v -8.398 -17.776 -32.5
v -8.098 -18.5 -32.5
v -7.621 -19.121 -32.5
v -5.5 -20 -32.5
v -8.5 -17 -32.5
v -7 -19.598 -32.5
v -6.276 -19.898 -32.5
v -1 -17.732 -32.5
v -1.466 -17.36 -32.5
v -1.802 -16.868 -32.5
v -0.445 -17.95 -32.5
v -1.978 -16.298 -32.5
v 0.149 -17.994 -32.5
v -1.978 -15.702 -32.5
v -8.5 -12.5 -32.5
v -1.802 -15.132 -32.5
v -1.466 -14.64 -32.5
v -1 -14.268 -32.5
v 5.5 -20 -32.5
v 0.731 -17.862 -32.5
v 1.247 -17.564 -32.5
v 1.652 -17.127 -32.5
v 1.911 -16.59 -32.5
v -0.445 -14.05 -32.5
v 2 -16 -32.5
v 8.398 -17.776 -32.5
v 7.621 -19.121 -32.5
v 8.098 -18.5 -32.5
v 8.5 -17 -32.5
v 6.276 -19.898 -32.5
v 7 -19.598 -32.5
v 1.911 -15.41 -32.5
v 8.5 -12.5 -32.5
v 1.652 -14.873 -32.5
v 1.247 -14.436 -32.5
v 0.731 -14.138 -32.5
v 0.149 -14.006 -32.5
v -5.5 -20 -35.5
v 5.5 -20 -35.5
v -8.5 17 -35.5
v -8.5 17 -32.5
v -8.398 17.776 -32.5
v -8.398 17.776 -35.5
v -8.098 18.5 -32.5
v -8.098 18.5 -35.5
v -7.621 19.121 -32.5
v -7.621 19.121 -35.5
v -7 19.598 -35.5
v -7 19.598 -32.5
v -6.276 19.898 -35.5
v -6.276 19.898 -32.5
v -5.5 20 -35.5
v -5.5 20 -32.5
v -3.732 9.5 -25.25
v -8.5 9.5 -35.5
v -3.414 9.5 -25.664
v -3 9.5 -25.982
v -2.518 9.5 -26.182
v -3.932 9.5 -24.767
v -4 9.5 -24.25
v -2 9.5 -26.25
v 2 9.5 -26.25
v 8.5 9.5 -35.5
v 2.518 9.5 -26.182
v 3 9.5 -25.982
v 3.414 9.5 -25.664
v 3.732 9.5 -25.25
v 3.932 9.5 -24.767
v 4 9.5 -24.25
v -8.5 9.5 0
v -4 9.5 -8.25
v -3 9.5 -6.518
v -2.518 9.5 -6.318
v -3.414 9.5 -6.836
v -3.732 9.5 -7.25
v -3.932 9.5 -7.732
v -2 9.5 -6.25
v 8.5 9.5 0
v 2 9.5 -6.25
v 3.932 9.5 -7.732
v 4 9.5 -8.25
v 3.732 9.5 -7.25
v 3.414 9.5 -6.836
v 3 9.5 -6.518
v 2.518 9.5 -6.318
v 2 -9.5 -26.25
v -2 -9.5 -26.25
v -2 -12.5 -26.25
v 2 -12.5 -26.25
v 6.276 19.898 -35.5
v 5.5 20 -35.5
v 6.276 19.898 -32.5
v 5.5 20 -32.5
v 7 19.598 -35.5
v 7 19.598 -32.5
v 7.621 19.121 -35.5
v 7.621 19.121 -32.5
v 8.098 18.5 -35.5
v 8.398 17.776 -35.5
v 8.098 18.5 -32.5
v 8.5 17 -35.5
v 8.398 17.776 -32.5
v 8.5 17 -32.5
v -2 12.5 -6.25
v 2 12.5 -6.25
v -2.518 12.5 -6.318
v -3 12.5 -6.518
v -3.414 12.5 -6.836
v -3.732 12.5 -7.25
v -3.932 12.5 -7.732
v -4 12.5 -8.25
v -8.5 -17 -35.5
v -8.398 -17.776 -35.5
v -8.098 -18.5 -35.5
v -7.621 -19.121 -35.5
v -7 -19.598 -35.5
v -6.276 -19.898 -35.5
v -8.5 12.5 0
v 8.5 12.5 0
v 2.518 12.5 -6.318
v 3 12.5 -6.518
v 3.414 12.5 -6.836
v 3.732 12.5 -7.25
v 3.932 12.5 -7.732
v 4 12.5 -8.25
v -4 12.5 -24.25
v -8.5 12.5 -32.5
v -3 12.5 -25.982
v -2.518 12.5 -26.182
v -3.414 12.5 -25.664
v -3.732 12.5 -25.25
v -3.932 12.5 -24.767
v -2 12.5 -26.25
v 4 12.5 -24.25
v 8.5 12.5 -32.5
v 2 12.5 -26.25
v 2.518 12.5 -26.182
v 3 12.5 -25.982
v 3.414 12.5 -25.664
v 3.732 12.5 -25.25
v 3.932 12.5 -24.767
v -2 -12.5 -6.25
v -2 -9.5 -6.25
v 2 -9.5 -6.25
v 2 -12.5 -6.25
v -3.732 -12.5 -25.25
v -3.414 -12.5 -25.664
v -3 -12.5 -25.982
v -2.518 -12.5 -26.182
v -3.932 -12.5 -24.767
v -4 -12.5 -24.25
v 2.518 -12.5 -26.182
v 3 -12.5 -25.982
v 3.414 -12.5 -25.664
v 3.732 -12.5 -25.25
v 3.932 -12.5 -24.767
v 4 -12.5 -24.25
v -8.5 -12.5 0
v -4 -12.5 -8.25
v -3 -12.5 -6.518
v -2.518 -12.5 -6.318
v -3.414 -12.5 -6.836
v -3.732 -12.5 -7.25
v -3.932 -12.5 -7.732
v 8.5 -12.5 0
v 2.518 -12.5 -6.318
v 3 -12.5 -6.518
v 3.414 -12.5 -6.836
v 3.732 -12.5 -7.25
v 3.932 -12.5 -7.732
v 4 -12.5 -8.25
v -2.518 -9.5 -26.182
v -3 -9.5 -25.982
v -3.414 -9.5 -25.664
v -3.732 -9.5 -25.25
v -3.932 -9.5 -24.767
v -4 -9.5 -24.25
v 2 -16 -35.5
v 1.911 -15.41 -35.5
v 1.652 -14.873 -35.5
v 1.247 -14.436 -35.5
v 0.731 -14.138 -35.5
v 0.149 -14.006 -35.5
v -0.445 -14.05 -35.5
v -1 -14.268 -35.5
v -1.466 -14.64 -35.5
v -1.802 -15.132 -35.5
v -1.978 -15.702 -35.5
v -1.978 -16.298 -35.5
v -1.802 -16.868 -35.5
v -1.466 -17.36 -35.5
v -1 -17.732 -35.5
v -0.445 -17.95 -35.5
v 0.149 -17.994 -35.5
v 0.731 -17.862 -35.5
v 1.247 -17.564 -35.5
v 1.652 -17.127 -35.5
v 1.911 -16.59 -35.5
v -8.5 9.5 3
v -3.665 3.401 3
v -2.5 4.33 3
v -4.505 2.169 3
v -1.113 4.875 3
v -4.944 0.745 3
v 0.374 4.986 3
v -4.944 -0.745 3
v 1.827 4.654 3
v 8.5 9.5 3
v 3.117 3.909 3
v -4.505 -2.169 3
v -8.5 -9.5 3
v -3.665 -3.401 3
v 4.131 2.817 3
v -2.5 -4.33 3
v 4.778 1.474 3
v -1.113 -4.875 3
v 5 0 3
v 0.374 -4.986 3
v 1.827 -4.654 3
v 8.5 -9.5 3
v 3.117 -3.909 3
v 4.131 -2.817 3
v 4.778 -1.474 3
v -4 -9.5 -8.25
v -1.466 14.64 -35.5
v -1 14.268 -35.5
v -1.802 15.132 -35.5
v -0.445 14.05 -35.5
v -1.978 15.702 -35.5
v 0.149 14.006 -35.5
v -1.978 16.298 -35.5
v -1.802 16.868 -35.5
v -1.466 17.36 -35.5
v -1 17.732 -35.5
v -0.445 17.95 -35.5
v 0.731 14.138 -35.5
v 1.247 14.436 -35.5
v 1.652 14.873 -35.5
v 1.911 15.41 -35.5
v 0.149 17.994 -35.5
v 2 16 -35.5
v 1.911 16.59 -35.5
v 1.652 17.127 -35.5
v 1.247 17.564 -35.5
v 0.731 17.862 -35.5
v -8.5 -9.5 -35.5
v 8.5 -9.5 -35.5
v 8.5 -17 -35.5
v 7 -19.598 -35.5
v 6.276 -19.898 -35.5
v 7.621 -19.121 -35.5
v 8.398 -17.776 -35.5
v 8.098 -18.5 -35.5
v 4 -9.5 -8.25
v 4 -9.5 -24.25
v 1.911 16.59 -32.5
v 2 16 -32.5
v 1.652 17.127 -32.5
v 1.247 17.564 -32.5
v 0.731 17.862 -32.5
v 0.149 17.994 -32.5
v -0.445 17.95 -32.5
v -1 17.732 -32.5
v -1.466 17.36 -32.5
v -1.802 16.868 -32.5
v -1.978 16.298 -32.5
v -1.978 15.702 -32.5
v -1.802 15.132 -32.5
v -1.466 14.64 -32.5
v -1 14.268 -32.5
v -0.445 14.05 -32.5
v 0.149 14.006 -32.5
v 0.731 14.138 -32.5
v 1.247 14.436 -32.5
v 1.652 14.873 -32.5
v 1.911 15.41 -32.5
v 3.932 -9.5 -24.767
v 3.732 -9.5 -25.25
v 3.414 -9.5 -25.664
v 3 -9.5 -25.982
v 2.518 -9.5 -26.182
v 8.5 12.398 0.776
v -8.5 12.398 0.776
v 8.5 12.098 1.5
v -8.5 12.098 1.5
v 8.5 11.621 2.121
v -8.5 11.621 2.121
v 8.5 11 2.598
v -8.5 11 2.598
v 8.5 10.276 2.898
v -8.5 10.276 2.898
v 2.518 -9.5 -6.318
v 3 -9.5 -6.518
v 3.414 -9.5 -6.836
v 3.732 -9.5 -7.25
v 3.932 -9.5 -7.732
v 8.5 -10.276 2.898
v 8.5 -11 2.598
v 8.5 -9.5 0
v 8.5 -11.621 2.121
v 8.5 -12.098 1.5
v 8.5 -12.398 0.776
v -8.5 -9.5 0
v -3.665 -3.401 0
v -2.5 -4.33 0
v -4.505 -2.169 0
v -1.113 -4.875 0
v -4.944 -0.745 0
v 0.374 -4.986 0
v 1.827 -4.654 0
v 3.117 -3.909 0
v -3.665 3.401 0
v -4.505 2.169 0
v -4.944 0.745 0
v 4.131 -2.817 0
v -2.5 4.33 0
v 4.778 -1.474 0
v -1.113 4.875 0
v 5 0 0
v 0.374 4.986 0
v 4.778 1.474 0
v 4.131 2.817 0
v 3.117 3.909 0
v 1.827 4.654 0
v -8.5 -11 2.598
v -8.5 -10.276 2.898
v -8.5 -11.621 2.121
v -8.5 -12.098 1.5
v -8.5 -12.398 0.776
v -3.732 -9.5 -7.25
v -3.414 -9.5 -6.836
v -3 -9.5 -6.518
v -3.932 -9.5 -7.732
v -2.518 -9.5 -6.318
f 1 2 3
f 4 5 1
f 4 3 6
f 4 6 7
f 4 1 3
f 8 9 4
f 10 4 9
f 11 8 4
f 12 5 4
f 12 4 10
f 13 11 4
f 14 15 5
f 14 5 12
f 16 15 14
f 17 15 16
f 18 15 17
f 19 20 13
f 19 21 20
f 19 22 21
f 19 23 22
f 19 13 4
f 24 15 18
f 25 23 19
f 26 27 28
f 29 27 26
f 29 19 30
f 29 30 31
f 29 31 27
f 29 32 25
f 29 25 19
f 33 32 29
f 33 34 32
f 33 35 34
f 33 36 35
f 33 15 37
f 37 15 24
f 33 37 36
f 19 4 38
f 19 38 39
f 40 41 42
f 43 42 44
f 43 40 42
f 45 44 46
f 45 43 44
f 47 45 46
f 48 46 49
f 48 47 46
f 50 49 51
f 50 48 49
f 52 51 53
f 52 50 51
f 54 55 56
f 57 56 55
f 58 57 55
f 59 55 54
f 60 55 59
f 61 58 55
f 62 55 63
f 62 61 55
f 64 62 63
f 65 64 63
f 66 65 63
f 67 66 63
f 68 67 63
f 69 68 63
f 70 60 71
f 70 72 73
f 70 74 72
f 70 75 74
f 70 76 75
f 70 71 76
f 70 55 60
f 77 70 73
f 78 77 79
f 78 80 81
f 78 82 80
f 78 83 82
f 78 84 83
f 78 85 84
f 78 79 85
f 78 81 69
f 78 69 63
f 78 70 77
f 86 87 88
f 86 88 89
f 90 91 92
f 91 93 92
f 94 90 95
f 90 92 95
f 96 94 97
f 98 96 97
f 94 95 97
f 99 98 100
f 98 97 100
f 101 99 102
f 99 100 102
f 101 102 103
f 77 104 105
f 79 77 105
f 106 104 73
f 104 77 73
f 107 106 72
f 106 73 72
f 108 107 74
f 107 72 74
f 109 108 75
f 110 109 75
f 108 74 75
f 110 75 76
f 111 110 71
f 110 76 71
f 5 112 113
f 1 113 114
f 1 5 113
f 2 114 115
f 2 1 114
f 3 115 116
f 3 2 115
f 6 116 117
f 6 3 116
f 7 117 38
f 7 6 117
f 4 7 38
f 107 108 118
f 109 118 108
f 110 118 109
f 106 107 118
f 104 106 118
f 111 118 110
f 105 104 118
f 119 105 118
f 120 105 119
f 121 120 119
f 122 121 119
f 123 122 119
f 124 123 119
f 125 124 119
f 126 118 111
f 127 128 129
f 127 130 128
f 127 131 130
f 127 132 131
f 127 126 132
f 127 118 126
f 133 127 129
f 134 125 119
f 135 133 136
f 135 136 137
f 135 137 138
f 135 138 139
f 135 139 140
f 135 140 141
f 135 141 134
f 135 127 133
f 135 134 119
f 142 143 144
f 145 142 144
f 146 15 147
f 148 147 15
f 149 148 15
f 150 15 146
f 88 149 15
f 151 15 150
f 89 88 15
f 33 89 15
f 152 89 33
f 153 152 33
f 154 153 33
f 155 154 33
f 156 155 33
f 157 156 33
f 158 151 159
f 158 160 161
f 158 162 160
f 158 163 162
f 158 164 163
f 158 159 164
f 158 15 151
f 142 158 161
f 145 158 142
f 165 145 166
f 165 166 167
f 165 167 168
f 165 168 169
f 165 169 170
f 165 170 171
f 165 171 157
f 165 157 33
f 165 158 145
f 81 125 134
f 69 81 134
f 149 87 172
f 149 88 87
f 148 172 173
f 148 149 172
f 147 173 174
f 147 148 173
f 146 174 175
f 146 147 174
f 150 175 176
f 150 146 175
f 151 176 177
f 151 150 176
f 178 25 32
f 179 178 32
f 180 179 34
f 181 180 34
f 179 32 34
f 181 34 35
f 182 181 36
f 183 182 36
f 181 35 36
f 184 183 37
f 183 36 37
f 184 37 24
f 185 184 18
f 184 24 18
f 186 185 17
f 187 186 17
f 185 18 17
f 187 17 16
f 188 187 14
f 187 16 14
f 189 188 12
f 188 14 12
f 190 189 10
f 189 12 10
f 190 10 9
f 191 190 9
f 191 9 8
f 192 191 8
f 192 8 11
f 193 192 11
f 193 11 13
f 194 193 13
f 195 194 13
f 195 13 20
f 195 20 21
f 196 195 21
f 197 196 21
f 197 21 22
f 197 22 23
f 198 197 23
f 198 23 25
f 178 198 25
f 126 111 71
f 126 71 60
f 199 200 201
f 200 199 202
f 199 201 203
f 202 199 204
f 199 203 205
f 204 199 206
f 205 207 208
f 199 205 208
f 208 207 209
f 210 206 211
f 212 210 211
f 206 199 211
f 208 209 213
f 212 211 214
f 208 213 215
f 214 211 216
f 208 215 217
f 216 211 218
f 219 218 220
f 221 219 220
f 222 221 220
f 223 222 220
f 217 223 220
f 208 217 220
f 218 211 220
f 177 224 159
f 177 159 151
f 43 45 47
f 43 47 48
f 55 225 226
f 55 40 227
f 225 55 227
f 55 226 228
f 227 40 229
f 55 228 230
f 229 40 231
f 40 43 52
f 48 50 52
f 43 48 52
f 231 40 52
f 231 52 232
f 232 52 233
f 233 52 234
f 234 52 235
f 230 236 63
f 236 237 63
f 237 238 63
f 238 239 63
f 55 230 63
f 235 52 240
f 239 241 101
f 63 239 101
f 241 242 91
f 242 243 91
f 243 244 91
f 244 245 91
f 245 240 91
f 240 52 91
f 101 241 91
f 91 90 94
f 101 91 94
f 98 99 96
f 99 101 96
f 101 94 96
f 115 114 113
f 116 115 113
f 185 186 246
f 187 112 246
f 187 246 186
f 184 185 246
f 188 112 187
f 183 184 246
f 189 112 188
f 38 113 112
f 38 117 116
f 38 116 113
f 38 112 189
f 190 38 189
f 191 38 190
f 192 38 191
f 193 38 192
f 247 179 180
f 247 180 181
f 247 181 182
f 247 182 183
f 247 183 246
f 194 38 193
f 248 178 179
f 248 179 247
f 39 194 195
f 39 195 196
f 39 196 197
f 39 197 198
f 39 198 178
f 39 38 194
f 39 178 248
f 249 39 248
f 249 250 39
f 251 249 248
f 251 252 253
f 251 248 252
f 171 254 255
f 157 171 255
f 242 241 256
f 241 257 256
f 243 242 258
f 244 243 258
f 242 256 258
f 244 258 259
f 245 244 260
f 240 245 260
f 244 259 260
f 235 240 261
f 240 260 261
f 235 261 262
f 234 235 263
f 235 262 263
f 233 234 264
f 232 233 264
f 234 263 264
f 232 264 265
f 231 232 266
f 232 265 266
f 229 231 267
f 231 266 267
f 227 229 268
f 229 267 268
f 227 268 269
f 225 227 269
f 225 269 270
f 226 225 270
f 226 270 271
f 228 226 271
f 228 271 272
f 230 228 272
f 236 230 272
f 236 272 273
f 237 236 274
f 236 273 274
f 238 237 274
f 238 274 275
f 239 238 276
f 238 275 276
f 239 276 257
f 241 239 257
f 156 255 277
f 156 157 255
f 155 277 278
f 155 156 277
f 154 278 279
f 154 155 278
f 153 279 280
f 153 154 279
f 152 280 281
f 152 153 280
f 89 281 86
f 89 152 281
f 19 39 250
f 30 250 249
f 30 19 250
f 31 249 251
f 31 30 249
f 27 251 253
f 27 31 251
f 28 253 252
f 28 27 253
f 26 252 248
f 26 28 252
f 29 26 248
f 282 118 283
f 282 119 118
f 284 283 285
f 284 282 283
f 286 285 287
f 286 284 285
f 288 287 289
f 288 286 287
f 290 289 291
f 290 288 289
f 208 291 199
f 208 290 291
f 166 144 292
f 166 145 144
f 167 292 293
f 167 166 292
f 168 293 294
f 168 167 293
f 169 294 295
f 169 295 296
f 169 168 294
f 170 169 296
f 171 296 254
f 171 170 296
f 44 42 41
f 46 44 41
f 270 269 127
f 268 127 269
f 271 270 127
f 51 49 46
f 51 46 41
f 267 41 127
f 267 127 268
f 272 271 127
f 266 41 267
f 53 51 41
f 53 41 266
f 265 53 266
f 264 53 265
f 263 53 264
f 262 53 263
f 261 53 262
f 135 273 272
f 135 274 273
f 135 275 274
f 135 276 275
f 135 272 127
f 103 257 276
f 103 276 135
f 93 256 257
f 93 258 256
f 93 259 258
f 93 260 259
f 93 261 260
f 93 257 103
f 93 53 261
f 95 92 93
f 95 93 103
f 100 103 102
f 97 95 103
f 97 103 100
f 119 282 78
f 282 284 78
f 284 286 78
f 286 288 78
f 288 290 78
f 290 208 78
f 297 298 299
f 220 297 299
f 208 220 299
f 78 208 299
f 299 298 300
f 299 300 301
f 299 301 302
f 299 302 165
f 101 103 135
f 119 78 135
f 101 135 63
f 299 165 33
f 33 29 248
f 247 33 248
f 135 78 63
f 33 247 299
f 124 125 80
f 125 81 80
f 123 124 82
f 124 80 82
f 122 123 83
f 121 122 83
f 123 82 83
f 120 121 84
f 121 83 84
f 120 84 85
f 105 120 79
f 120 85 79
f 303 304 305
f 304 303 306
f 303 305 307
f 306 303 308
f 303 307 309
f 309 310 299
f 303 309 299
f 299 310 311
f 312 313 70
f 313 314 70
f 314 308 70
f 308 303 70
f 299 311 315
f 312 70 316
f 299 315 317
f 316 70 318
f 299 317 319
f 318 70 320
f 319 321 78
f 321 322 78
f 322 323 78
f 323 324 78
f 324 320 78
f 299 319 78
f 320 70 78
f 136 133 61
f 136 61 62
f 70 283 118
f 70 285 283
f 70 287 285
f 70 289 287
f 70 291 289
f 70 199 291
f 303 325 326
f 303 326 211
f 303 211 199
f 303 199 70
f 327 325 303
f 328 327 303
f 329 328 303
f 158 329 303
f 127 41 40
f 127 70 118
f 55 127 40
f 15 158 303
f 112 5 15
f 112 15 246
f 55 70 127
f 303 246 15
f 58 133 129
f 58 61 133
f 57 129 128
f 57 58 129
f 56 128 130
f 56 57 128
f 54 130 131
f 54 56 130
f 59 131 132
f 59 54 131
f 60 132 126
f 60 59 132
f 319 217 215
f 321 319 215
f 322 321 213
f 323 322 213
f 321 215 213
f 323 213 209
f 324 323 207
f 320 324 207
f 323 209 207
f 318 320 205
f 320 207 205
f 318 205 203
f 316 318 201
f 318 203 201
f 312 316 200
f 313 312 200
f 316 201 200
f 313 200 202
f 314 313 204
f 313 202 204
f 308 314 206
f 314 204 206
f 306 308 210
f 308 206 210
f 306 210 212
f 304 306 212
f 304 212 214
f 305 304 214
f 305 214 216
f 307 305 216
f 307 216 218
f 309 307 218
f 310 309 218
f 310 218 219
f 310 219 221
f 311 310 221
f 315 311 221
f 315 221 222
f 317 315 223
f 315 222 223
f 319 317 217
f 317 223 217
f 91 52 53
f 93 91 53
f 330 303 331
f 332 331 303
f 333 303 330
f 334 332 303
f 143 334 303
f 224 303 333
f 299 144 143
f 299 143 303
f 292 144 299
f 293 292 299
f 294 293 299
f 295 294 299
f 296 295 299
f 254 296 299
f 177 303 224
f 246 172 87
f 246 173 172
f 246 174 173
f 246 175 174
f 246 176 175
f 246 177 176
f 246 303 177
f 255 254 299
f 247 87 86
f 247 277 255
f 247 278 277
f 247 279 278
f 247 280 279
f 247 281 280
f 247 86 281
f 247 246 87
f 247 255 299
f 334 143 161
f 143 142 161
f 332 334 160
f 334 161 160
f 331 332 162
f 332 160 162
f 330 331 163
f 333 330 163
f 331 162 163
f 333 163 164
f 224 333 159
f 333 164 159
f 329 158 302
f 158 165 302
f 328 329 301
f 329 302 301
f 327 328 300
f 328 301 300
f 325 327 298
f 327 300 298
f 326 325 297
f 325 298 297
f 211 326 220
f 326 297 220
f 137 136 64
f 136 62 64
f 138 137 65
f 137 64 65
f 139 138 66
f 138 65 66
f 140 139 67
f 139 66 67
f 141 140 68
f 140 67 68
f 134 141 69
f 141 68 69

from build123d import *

# Parameters (mm, degrees)
SKETCH_1_R          = 2
EXTRUDE_1_DEPTH     = 2
SKETCH_4_W          = 8
SKETCH_4_H          = 2
EXTRUDE_3_DEPTH     = 35.5
SKETCH_5_R          = 1
CUT_EXTRUDE_1_DEPTH = 8
SKETCH_6_W          = 8
SKETCH_6_H          = 10
EXTRUDE_4_DEPTH     = 2
SKETCH_7_R          = 2
CUT_EXTRUDE_2_DEPTH = 2
EXTRUDE_5_DEPTH     = 4.5
EXTRUDE_6_DEPTH     = 4.5
FILLET_1_R          = 3
SKETCH_10_W         = 17
SKETCH_10_H         = 24
SKETCH_10_R         = 1
SKETCH_10_R_2       = 2
EXTRUDE_7_DEPTH     = 1
SKETCH_12_W         = 17
SKETCH_12_H         = 35.5
EXTRUDE_8_DEPTH     = 0.5
SKETCH_13_W         = 17
SKETCH_13_H         = 35.5
EXTRUDE_9_DEPTH     = 0.5
EXTRUDE_START       = 1
SKETCH_14_R         = 2
EXTRUDE_10_DEPTH    = 1
SKETCH_16_W         = 17
SKETCH_16_H         = 35.5
EXTRUDE_11_DEPTH    = 0.5
SKETCH_17_W         = 17
SKETCH_17_H         = 35.5
EXTRUDE_12_DEPTH    = 0.5
EXTRUDE_START_2     = -3
SKETCH_18_R         = 1
EXTRUDE_13_DEPTH    = 3
SKETCH_19_R         = 5
CUT_EXTRUDE_3_DEPTH = 3
SKETCH_20_W         = 8
SKETCH_20_H         = 20
CUT_EXTRUDE_4_DEPTH = 34
FILLET_3_R          = 2
FILLET_4_R          = 3


with BuildPart() as part:
    # 草图1 → 凸台-拉伸1 (new body)
    # profile 1 of 5: a face of its own
    with BuildSketch(Plane.XY):
        with BuildLine():
            Line((4, 6.34428877), (4, -6.34428877))
            ThreePointArc((4, -6.34428877), (6.566962768, -3.622844187), (7.5, 0))
            ThreePointArc((7.5, 0), (6.566962768, 3.622844187), (4, 6.34428877))
        make_face()
    # profile 2 of 5: a face of its own
    with BuildSketch(Plane.XY):
        with BuildLine():
            Line((-4, 6.34428877), (-4, -6.34428877))
            ThreePointArc((-4, -6.34428877), (0, -7.5), (4, -6.34428877))
            Line((4, -6.34428877), (4, 6.34428877))
            ThreePointArc((4, 6.34428877), (0, 7.5), (-4, 6.34428877))
        make_face()
        Circle(SKETCH_1_R, mode=Mode.SUBTRACT)
    # profile 3 of 5: a face of its own
    with BuildSketch(Plane.XY):
        with BuildLine():
            ThreePointArc((-4, 6.34428877), (-7.5, 0), (-4, -6.34428877))
            Line((-4, -6.34428877), (-4, 6.34428877))
        make_face()
    # profile 4 of 5: a face of its own
    with BuildSketch(Plane.XY):
        with BuildLine():
            Line((-4, 10), (-4, 6.34428877))
            ThreePointArc((-4, 6.34428877), (0, 7.5), (4, 6.34428877))
            Line((4, 6.34428877), (4, 10))
            Line((4, 10), (-4, 10))
        make_face()
    # profile 5 of 5: a face of its own
    with BuildSketch(Plane.XY):
        with BuildLine():
            Line((-4, -6.34428877), (-4, -10))
            Line((-4, -10), (4, -10))
            Line((4, -10), (4, -6.34428877))
            ThreePointArc((4, -6.34428877), (0, -7.5), (-4, -6.34428877))
        make_face()
    extrude(amount=EXTRUDE_1_DEPTH)

    # 草图4 → 凸台-拉伸3 (add)
    with BuildSketch(Plane.XY.offset(2)):
        with Locations((0, -11)):
            Rectangle(SKETCH_4_W, SKETCH_4_H)
        with Locations((0, 11)):
            Rectangle(SKETCH_4_W, SKETCH_4_H)
    extrude(amount=-EXTRUDE_3_DEPTH)

    # 草图5 → 切除-拉伸1 (cut)
    with BuildSketch(Plane(origin=(0, 0, 0), x_dir=(-1, 0, 0), z_dir=(0, 0, -1))):
        with Locations((0, 5.5)):
            Circle(SKETCH_5_R)
        with Locations((0, -5.5)):
            Circle(SKETCH_5_R)
    extrude(amount=-CUT_EXTRUDE_1_DEPTH, mode=Mode.SUBTRACT)

    # 草图6 → 凸台-拉伸4 (add)
    with BuildSketch(Plane(origin=(0, 0, -33.5), x_dir=(-1, 0, 0), z_dir=(0, 0, -1))):
        with Locations((0, -15)):
            Rectangle(SKETCH_6_W, SKETCH_6_H)
        with Locations((0, 15)):
            Rectangle(SKETCH_6_W, SKETCH_6_H)
    extrude(amount=EXTRUDE_4_DEPTH)

    # 草图7 → 切除-拉伸2 (cut)
    with BuildSketch(Plane.XY.offset(-33.5)):
        with Locations((0, 16)):
            Circle(SKETCH_7_R)
        with Locations((0, -16)):
            Circle(SKETCH_7_R)
    extrude(amount=-CUT_EXTRUDE_2_DEPTH, mode=Mode.SUBTRACT)

    # 草图8 → 凸台-拉伸5 (add)
    with BuildSketch(Plane.ZY.offset(4)):
        Polygon((-35.5, 10), (0, 10), (0, 6.34428877), (2, 6.34428877), (2, 12), (-33.5, 12), (-33.5, 20), (-35.5, 20), align=None)
        Polygon((-33.5, -12), (2, -12), (2, -6.34428877), (2, 6.34428877), (0, 6.34428877), (0, -6.34428877), (0, -10), (-35.5, -10), (-35.5, -20), (-33.5, -20), align=None)
    extrude(amount=EXTRUDE_5_DEPTH)

    # 草图9 → 凸台-拉伸6 (add)
    with BuildSketch(Plane(origin=(4, 0, 0), x_dir=(0, 0, -1), z_dir=(1, 0, 0))):
        Polygon((-2, 6.34428877), (-2, -6.34428877), (-2, -12), (33.5, -12), (33.5, -20), (35.5, -20), (35.5, -10), (0, -10), (0, -6.34428877), (0, 6.34428877), (0, 10), (35.5, 10), (35.5, 20), (33.5, 20), (33.5, 12), (-2, 12), align=None)
    extrude(amount=EXTRUDE_6_DEPTH)

    # 圆角1
    fillet_1_edges = [part.edges().sort_by_distance(p)[0] for p in [
        (-8.5, -20, -34.5),
        (-8.5, 20, -34.5),
        (8.5, 20, -34.5),
        (8.5, -20, -34.5),
    ]]
    fillet(fillet_1_edges, radius=FILLET_1_R)

    # 草图10 → 凸台-拉伸7 (add)
    with BuildSketch(Plane.XY.offset(2)):
        Rectangle(SKETCH_10_W, SKETCH_10_H)
        with Locations(Location((0, -5.5, 0), (0, 0, 180))):
            Circle(SKETCH_10_R, mode=Mode.SUBTRACT)
        Circle(SKETCH_10_R_2, mode=Mode.SUBTRACT)
        with Locations(Location((0, 5.5, 0), (0, 0, 180))):
            Circle(SKETCH_10_R, mode=Mode.SUBTRACT)
    extrude(amount=EXTRUDE_7_DEPTH)

    # 草图12 → 凸台-拉伸8 (add)
    with BuildSketch(Plane.XZ.offset(-10)):
        with Locations((0, -17.75)):
            Rectangle(SKETCH_12_W, SKETCH_12_H)
    extrude(amount=EXTRUDE_8_DEPTH)

    # 草图13 → 凸台-拉伸9 (add)
    with BuildSketch(Plane(origin=(0, -10, 0), x_dir=(1, 0, 0), z_dir=(0, 1, 0))):
        with Locations((0, 17.75)):
            Rectangle(SKETCH_13_W, SKETCH_13_H)
    extrude(amount=EXTRUDE_9_DEPTH)

    # 草图14 → 凸台-拉伸10 (add)
    # profile 1 of 2: a face of its own
    with BuildSketch(Plane.XY.offset(-33.5).offset(EXTRUDE_START)):
        with BuildLine():
            Line((-8.5, -12), (-8.5, -17))
            ThreePointArc((-8.5, -17), (-7.621320344, -19.121320344), (-5.5, -20))
            Line((-5.5, -20), (5.5, -20))
            ThreePointArc((5.5, -20), (7.621320344, -19.121320344), (8.5, -17))
            Line((8.5, -17), (8.5, -12))
            Line((8.5, -12), (-8.5, -12))
        make_face()
        with Locations((0, -16)):
            Circle(SKETCH_14_R, mode=Mode.SUBTRACT)
    # profile 2 of 2: a face of its own
    with BuildSketch(Plane.XY.offset(-33.5).offset(EXTRUDE_START)):
        with BuildLine():
            Line((5.5, 20), (-5.5, 20))
            ThreePointArc((-5.5, 20), (-7.621320344, 19.121320344), (-8.5, 17))
            Line((-8.5, 17), (-8.5, 12))
            Line((-8.5, 12), (8.5, 12))
            Line((8.5, 12), (8.5, 17))
            ThreePointArc((8.5, 17), (7.621320344, 19.121320344), (5.5, 20))
        make_face()
        with Locations((0, 16)):
            Circle(SKETCH_14_R, mode=Mode.SUBTRACT)
    extrude(amount=-EXTRUDE_10_DEPTH)

    # 草图16 → 凸台-拉伸11 (add)
    with BuildSketch(Plane.XZ.offset(12)):
        with Locations((0, -14.75)):
            Rectangle(SKETCH_16_W, SKETCH_16_H)
    extrude(amount=EXTRUDE_11_DEPTH)

    # 草图17 → 凸台-拉伸12 (add)
    with BuildSketch(Plane(origin=(0, 12, 0), x_dir=(1, 0, 0), z_dir=(0, 1, 0))):
        with Locations((0, 14.75)):
            Rectangle(SKETCH_17_W, SKETCH_17_H)
    extrude(amount=EXTRUDE_12_DEPTH)

    # 草图18 → 凸台-拉伸13 (add)
    with BuildSketch(Plane.XY.offset(3).offset(EXTRUDE_START_2)):
        with Locations((0, -5.5)):
            Circle(SKETCH_18_R)
        with Locations((0, 5.5)):
            Circle(SKETCH_18_R)
    extrude(amount=EXTRUDE_13_DEPTH)

    # 草图19 → 切除-拉伸3 (cut)
    with BuildSketch(Plane.XY.offset(3)):
        Circle(SKETCH_19_R)
    extrude(amount=-CUT_EXTRUDE_3_DEPTH, mode=Mode.SUBTRACT)

    # 草图20 → 切除-拉伸4 (cut)
    with BuildSketch(Plane(origin=(0, 12.5, 0), x_dir=(1, 0, 0), z_dir=(0, 1, 0))):
        with Locations((0, 16.249764914)):
            Rectangle(SKETCH_20_W, SKETCH_20_H)
    extrude(amount=-CUT_EXTRUDE_4_DEPTH, mode=Mode.SUBTRACT)

    # 圆角3
    fillet_3_edges = [part.edges().sort_by_distance(p)[0] for p in [
        (4, 11, -26.249764914),
        (4, 11, -6.249764914),
        (-4, 11, -6.249764914),
        (-4, 11, -26.249764914),
        (4, -11, -26.249764914),
        (4, -11, -6.249764914),
        (-4, -11, -6.249764914),
        (-4, -11, -26.249764914),
    ]]
    fillet(fillet_3_edges, radius=FILLET_3_R)

    # 圆角4
    fillet_4_edges = [part.edges().sort_by_distance(p)[0] for p in [
        (0, -12.5, 3),
        (0, 12.5, 3),
    ]]
    fillet(fillet_4_edges, radius=FILLET_4_R)


solid = part.part
